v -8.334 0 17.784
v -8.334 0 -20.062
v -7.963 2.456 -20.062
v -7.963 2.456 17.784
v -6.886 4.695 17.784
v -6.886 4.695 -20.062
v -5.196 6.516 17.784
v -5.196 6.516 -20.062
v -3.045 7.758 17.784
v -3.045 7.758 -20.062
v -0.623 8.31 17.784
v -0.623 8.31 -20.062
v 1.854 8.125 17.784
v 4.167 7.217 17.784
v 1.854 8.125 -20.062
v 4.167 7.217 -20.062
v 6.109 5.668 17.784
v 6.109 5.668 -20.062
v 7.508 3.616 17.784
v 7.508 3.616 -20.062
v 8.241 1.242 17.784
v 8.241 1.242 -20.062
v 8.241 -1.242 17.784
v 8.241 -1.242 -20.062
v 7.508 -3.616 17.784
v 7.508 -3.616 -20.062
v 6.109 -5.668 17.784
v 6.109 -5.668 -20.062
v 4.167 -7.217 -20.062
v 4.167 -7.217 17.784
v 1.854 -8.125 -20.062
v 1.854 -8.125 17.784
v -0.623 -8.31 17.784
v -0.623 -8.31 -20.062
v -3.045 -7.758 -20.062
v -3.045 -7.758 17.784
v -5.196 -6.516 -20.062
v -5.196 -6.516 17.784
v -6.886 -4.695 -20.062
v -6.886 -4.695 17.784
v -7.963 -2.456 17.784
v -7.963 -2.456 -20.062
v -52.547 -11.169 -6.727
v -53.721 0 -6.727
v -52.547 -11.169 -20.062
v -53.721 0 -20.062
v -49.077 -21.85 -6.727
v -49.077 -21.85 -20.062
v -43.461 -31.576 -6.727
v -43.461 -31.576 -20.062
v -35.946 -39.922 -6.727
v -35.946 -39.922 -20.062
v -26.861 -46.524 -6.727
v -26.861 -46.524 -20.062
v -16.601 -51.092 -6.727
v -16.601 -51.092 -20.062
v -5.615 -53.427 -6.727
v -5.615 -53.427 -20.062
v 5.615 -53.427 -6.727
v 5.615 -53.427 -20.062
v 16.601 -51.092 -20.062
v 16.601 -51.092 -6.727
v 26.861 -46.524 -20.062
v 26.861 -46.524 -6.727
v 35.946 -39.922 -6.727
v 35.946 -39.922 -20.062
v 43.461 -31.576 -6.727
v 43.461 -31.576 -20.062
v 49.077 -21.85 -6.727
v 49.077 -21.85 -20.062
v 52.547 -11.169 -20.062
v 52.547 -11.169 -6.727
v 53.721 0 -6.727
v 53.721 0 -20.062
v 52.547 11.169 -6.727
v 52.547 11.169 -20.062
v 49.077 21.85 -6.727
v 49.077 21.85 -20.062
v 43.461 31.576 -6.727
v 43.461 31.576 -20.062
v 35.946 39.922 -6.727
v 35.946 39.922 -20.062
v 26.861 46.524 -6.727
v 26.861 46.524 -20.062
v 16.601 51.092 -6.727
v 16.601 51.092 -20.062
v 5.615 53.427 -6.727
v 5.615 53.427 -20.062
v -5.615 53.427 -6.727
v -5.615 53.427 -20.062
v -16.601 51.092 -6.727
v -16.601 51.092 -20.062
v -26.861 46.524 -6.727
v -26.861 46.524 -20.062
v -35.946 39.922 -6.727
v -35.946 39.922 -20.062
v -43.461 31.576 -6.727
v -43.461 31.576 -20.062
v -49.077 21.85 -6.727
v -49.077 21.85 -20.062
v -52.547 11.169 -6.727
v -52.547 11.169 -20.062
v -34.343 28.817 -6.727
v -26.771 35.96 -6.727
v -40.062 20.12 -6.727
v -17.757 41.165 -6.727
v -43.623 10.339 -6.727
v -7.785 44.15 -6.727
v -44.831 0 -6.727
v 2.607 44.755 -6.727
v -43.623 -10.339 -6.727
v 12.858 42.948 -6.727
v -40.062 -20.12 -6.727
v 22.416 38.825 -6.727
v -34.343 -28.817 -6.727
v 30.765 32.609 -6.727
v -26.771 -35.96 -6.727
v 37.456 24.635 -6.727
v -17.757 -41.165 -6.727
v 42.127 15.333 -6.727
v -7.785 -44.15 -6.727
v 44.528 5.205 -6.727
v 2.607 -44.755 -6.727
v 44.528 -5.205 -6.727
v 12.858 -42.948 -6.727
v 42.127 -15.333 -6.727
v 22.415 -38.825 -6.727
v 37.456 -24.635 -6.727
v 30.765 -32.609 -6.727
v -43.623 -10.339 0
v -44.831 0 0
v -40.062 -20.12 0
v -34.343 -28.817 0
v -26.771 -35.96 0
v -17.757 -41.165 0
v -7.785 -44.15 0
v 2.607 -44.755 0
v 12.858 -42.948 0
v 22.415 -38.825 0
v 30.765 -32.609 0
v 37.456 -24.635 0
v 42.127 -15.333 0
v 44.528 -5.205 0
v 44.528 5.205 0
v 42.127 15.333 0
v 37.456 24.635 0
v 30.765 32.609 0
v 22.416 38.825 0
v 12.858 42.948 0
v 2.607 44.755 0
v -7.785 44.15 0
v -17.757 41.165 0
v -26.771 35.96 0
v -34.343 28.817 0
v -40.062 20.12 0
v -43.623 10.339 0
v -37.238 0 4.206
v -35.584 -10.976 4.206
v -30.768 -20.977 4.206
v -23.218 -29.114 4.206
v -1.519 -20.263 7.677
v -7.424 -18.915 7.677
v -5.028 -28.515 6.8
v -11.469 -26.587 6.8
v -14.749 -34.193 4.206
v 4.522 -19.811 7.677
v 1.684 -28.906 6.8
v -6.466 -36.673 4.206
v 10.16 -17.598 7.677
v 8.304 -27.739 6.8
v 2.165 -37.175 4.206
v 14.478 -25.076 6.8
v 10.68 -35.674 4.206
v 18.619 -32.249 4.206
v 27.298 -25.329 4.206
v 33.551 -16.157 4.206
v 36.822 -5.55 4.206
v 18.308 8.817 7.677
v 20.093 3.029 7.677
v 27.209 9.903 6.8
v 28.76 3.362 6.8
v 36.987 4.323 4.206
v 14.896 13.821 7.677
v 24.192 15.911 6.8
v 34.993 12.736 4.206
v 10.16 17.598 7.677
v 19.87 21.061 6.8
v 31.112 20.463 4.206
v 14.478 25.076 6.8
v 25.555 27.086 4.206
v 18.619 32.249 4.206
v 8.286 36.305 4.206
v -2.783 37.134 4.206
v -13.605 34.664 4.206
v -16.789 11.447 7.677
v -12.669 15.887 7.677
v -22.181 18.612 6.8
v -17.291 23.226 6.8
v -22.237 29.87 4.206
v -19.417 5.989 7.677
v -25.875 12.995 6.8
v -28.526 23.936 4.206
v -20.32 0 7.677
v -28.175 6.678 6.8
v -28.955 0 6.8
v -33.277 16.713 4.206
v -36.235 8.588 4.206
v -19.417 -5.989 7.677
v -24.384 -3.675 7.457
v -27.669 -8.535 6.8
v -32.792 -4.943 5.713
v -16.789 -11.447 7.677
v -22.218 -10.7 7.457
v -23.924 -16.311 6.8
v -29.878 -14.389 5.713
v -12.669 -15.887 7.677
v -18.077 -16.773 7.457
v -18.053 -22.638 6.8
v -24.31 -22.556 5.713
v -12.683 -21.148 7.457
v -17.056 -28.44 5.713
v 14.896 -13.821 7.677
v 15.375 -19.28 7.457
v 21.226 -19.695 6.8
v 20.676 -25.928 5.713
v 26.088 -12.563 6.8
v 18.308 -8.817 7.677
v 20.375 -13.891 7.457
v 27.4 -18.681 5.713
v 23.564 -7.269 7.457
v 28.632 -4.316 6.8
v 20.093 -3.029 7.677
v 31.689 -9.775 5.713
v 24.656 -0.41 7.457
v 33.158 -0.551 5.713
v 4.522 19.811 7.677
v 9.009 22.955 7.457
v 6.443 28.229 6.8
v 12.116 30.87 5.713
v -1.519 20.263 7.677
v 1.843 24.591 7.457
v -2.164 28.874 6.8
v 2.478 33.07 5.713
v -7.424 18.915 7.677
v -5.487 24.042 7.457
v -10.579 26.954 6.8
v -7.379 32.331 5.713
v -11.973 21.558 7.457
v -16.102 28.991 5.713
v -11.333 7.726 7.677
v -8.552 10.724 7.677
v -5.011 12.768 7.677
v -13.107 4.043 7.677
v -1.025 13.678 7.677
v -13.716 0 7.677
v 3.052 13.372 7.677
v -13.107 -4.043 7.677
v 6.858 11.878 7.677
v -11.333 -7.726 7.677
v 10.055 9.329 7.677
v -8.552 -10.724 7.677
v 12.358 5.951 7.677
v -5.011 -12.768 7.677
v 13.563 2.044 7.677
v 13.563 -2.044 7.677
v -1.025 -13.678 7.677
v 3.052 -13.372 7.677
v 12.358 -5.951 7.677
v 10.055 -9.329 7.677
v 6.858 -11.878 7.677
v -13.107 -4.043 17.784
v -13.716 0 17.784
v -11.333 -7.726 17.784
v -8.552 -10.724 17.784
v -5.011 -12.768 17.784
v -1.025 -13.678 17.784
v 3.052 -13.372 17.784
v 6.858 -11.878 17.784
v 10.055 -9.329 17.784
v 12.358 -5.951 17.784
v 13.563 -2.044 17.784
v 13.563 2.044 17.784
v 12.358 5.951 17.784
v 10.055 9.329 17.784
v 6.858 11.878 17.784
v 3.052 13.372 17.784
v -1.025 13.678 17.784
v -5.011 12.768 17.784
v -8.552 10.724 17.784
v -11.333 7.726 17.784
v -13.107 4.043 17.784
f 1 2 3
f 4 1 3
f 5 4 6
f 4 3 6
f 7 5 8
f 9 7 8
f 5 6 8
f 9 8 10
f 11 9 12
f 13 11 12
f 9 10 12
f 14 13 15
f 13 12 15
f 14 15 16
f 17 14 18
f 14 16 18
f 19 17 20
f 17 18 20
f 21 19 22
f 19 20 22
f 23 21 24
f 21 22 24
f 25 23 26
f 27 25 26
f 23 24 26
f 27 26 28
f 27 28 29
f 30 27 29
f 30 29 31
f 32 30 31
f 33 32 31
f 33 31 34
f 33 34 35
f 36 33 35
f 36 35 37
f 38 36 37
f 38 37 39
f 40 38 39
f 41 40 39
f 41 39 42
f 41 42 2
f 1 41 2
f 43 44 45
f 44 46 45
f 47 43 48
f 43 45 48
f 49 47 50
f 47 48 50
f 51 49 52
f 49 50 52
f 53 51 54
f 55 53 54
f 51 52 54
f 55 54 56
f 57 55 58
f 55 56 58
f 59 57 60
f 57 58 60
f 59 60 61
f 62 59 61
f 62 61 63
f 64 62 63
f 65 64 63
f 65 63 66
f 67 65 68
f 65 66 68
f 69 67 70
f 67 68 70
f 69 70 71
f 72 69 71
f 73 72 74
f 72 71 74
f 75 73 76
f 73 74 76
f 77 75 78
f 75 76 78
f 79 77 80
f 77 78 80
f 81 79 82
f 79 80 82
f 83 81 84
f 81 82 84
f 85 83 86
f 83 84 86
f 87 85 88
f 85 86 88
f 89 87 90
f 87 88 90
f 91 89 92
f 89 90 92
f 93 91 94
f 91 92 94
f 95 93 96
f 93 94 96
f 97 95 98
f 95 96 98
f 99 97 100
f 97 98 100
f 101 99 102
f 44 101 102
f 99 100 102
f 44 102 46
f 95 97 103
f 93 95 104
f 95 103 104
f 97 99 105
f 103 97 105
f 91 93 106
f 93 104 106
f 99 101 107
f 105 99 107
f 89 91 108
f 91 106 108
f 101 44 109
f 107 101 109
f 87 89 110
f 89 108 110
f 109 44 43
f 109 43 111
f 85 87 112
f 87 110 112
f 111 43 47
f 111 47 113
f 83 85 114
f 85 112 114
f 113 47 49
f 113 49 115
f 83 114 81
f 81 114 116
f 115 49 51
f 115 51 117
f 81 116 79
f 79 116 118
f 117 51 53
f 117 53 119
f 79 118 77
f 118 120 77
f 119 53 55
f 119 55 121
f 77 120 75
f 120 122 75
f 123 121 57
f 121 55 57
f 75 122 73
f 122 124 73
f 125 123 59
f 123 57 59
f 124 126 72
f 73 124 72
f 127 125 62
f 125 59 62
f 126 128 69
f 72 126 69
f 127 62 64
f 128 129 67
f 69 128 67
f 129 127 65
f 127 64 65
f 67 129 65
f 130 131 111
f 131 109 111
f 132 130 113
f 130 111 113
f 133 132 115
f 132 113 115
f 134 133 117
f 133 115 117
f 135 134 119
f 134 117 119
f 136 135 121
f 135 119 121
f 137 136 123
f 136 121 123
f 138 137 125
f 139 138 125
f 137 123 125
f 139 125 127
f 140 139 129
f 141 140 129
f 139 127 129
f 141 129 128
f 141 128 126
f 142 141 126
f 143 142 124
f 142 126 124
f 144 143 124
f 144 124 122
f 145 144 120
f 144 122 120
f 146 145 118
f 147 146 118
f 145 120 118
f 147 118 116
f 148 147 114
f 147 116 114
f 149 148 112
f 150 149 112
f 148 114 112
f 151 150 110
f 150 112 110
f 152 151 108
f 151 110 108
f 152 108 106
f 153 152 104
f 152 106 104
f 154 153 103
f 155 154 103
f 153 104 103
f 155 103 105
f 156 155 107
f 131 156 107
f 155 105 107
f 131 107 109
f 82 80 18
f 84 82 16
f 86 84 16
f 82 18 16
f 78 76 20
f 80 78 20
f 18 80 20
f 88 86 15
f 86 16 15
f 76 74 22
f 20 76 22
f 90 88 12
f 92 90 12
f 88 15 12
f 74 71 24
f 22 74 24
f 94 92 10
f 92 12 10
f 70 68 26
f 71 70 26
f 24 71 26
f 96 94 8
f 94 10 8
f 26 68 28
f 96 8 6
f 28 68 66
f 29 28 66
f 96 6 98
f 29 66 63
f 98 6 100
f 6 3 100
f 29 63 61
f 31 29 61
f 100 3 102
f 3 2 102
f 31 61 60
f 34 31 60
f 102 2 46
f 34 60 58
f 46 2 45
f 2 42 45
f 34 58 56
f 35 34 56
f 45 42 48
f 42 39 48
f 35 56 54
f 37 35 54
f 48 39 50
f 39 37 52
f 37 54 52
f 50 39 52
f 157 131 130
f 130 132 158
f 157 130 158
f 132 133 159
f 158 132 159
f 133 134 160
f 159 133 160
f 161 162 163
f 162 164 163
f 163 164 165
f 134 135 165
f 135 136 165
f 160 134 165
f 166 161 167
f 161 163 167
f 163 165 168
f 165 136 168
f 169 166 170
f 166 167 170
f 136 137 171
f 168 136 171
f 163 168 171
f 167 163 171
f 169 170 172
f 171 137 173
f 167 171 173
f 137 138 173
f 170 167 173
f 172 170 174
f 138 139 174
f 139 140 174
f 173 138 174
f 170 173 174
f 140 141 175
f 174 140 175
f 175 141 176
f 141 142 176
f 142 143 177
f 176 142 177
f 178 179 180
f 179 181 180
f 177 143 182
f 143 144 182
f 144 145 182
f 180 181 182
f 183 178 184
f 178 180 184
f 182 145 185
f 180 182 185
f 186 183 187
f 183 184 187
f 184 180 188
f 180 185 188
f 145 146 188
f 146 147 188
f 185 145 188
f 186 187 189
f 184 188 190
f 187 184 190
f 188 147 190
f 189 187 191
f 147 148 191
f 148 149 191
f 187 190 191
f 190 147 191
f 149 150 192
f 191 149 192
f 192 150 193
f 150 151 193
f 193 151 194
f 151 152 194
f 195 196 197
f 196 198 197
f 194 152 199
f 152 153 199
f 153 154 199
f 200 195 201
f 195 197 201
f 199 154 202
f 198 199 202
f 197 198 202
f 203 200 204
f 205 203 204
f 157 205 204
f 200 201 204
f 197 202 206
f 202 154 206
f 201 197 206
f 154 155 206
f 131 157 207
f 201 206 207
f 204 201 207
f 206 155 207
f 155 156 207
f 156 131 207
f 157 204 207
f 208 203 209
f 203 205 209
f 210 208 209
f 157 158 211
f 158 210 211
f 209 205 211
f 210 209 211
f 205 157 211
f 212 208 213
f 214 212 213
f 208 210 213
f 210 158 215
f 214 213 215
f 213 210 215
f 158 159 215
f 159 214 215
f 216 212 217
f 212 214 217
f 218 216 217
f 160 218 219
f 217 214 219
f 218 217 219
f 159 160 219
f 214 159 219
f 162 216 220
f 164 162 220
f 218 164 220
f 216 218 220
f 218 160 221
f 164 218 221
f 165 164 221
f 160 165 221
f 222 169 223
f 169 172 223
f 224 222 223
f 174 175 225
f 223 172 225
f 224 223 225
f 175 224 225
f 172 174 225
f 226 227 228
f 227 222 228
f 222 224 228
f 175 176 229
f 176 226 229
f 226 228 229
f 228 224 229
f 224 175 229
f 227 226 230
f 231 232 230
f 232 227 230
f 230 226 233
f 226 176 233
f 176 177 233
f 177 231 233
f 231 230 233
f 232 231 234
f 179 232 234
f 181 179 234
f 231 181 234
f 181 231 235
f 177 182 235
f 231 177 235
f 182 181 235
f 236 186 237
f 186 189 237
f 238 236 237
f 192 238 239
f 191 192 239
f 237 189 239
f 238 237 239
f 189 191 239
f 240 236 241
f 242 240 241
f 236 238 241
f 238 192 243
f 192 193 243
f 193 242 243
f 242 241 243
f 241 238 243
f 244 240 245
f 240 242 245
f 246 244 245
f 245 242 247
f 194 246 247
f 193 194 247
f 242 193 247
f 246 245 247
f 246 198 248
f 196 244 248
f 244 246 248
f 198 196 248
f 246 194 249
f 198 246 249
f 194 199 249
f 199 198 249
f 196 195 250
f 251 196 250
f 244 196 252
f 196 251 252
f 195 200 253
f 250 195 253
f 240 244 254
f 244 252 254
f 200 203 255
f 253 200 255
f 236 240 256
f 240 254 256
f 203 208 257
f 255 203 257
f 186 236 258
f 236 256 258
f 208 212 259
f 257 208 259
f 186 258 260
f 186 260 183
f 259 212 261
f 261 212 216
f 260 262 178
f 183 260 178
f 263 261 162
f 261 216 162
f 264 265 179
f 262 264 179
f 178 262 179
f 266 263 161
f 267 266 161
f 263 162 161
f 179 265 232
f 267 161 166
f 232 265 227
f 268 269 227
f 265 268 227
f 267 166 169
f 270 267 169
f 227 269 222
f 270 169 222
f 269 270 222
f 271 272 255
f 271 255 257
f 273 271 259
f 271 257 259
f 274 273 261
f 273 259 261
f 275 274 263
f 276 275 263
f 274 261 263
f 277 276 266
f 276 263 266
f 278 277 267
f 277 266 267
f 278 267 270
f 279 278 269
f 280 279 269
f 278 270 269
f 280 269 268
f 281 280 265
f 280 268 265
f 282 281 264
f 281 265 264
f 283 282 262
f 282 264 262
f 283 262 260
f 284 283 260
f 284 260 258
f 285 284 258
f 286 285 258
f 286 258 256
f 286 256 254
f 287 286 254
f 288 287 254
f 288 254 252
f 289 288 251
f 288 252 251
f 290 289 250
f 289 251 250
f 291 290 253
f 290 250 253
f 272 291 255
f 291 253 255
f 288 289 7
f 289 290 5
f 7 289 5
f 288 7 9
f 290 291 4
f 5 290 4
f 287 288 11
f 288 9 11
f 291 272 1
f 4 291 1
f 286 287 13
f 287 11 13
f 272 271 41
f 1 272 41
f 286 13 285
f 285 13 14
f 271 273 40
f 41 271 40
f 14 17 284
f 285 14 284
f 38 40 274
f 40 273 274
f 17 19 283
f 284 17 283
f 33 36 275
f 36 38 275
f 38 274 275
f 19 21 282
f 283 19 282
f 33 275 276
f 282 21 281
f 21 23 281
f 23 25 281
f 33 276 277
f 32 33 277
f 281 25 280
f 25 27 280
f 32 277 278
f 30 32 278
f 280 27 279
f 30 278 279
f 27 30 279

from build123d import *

# Parameters (mm, degrees)
F3_D = 16.66748


with BuildPart() as f1:
    # F0 (on Front) → F1 (revolve)
    with BuildSketch(Plane.XZ):
        with BuildLine():
            Line((-44.831, -6.7267071241), (-53.721, -6.7267071241))
            Line((-53.721, -6.7267071241), (-53.721, -20.0617071241))
            Line((-53.721, -20.0617071241), (0, -20.0617071241))
            Line((0, -20.0617071241), (0, 17.7842928759))
            Line((0, 17.7842928759), (-13.716, 17.7842928759))
            Line((-13.716, 17.7842928759), (-13.716, 7.6767612798))
            Line((-13.716, 7.6767612798), (-20.32, 7.6767612798))
            ThreePointArc((-20.32, 7.6767612798), (-33.1625249148, 5.7126824661), (-44.831, 0))
            Line((-44.831, 0), (-44.831, -6.7267071241))
        make_face()
    revolve(axis=Axis((0, 0, -1.1387071241), (0, 0, 1)))

    # F3 (through all)
    with Locations(Plane.XY.offset(17.7842928759)):
        with Locations((0, 0)):
            Hole(F3_D / 2)


solid = f1.part
